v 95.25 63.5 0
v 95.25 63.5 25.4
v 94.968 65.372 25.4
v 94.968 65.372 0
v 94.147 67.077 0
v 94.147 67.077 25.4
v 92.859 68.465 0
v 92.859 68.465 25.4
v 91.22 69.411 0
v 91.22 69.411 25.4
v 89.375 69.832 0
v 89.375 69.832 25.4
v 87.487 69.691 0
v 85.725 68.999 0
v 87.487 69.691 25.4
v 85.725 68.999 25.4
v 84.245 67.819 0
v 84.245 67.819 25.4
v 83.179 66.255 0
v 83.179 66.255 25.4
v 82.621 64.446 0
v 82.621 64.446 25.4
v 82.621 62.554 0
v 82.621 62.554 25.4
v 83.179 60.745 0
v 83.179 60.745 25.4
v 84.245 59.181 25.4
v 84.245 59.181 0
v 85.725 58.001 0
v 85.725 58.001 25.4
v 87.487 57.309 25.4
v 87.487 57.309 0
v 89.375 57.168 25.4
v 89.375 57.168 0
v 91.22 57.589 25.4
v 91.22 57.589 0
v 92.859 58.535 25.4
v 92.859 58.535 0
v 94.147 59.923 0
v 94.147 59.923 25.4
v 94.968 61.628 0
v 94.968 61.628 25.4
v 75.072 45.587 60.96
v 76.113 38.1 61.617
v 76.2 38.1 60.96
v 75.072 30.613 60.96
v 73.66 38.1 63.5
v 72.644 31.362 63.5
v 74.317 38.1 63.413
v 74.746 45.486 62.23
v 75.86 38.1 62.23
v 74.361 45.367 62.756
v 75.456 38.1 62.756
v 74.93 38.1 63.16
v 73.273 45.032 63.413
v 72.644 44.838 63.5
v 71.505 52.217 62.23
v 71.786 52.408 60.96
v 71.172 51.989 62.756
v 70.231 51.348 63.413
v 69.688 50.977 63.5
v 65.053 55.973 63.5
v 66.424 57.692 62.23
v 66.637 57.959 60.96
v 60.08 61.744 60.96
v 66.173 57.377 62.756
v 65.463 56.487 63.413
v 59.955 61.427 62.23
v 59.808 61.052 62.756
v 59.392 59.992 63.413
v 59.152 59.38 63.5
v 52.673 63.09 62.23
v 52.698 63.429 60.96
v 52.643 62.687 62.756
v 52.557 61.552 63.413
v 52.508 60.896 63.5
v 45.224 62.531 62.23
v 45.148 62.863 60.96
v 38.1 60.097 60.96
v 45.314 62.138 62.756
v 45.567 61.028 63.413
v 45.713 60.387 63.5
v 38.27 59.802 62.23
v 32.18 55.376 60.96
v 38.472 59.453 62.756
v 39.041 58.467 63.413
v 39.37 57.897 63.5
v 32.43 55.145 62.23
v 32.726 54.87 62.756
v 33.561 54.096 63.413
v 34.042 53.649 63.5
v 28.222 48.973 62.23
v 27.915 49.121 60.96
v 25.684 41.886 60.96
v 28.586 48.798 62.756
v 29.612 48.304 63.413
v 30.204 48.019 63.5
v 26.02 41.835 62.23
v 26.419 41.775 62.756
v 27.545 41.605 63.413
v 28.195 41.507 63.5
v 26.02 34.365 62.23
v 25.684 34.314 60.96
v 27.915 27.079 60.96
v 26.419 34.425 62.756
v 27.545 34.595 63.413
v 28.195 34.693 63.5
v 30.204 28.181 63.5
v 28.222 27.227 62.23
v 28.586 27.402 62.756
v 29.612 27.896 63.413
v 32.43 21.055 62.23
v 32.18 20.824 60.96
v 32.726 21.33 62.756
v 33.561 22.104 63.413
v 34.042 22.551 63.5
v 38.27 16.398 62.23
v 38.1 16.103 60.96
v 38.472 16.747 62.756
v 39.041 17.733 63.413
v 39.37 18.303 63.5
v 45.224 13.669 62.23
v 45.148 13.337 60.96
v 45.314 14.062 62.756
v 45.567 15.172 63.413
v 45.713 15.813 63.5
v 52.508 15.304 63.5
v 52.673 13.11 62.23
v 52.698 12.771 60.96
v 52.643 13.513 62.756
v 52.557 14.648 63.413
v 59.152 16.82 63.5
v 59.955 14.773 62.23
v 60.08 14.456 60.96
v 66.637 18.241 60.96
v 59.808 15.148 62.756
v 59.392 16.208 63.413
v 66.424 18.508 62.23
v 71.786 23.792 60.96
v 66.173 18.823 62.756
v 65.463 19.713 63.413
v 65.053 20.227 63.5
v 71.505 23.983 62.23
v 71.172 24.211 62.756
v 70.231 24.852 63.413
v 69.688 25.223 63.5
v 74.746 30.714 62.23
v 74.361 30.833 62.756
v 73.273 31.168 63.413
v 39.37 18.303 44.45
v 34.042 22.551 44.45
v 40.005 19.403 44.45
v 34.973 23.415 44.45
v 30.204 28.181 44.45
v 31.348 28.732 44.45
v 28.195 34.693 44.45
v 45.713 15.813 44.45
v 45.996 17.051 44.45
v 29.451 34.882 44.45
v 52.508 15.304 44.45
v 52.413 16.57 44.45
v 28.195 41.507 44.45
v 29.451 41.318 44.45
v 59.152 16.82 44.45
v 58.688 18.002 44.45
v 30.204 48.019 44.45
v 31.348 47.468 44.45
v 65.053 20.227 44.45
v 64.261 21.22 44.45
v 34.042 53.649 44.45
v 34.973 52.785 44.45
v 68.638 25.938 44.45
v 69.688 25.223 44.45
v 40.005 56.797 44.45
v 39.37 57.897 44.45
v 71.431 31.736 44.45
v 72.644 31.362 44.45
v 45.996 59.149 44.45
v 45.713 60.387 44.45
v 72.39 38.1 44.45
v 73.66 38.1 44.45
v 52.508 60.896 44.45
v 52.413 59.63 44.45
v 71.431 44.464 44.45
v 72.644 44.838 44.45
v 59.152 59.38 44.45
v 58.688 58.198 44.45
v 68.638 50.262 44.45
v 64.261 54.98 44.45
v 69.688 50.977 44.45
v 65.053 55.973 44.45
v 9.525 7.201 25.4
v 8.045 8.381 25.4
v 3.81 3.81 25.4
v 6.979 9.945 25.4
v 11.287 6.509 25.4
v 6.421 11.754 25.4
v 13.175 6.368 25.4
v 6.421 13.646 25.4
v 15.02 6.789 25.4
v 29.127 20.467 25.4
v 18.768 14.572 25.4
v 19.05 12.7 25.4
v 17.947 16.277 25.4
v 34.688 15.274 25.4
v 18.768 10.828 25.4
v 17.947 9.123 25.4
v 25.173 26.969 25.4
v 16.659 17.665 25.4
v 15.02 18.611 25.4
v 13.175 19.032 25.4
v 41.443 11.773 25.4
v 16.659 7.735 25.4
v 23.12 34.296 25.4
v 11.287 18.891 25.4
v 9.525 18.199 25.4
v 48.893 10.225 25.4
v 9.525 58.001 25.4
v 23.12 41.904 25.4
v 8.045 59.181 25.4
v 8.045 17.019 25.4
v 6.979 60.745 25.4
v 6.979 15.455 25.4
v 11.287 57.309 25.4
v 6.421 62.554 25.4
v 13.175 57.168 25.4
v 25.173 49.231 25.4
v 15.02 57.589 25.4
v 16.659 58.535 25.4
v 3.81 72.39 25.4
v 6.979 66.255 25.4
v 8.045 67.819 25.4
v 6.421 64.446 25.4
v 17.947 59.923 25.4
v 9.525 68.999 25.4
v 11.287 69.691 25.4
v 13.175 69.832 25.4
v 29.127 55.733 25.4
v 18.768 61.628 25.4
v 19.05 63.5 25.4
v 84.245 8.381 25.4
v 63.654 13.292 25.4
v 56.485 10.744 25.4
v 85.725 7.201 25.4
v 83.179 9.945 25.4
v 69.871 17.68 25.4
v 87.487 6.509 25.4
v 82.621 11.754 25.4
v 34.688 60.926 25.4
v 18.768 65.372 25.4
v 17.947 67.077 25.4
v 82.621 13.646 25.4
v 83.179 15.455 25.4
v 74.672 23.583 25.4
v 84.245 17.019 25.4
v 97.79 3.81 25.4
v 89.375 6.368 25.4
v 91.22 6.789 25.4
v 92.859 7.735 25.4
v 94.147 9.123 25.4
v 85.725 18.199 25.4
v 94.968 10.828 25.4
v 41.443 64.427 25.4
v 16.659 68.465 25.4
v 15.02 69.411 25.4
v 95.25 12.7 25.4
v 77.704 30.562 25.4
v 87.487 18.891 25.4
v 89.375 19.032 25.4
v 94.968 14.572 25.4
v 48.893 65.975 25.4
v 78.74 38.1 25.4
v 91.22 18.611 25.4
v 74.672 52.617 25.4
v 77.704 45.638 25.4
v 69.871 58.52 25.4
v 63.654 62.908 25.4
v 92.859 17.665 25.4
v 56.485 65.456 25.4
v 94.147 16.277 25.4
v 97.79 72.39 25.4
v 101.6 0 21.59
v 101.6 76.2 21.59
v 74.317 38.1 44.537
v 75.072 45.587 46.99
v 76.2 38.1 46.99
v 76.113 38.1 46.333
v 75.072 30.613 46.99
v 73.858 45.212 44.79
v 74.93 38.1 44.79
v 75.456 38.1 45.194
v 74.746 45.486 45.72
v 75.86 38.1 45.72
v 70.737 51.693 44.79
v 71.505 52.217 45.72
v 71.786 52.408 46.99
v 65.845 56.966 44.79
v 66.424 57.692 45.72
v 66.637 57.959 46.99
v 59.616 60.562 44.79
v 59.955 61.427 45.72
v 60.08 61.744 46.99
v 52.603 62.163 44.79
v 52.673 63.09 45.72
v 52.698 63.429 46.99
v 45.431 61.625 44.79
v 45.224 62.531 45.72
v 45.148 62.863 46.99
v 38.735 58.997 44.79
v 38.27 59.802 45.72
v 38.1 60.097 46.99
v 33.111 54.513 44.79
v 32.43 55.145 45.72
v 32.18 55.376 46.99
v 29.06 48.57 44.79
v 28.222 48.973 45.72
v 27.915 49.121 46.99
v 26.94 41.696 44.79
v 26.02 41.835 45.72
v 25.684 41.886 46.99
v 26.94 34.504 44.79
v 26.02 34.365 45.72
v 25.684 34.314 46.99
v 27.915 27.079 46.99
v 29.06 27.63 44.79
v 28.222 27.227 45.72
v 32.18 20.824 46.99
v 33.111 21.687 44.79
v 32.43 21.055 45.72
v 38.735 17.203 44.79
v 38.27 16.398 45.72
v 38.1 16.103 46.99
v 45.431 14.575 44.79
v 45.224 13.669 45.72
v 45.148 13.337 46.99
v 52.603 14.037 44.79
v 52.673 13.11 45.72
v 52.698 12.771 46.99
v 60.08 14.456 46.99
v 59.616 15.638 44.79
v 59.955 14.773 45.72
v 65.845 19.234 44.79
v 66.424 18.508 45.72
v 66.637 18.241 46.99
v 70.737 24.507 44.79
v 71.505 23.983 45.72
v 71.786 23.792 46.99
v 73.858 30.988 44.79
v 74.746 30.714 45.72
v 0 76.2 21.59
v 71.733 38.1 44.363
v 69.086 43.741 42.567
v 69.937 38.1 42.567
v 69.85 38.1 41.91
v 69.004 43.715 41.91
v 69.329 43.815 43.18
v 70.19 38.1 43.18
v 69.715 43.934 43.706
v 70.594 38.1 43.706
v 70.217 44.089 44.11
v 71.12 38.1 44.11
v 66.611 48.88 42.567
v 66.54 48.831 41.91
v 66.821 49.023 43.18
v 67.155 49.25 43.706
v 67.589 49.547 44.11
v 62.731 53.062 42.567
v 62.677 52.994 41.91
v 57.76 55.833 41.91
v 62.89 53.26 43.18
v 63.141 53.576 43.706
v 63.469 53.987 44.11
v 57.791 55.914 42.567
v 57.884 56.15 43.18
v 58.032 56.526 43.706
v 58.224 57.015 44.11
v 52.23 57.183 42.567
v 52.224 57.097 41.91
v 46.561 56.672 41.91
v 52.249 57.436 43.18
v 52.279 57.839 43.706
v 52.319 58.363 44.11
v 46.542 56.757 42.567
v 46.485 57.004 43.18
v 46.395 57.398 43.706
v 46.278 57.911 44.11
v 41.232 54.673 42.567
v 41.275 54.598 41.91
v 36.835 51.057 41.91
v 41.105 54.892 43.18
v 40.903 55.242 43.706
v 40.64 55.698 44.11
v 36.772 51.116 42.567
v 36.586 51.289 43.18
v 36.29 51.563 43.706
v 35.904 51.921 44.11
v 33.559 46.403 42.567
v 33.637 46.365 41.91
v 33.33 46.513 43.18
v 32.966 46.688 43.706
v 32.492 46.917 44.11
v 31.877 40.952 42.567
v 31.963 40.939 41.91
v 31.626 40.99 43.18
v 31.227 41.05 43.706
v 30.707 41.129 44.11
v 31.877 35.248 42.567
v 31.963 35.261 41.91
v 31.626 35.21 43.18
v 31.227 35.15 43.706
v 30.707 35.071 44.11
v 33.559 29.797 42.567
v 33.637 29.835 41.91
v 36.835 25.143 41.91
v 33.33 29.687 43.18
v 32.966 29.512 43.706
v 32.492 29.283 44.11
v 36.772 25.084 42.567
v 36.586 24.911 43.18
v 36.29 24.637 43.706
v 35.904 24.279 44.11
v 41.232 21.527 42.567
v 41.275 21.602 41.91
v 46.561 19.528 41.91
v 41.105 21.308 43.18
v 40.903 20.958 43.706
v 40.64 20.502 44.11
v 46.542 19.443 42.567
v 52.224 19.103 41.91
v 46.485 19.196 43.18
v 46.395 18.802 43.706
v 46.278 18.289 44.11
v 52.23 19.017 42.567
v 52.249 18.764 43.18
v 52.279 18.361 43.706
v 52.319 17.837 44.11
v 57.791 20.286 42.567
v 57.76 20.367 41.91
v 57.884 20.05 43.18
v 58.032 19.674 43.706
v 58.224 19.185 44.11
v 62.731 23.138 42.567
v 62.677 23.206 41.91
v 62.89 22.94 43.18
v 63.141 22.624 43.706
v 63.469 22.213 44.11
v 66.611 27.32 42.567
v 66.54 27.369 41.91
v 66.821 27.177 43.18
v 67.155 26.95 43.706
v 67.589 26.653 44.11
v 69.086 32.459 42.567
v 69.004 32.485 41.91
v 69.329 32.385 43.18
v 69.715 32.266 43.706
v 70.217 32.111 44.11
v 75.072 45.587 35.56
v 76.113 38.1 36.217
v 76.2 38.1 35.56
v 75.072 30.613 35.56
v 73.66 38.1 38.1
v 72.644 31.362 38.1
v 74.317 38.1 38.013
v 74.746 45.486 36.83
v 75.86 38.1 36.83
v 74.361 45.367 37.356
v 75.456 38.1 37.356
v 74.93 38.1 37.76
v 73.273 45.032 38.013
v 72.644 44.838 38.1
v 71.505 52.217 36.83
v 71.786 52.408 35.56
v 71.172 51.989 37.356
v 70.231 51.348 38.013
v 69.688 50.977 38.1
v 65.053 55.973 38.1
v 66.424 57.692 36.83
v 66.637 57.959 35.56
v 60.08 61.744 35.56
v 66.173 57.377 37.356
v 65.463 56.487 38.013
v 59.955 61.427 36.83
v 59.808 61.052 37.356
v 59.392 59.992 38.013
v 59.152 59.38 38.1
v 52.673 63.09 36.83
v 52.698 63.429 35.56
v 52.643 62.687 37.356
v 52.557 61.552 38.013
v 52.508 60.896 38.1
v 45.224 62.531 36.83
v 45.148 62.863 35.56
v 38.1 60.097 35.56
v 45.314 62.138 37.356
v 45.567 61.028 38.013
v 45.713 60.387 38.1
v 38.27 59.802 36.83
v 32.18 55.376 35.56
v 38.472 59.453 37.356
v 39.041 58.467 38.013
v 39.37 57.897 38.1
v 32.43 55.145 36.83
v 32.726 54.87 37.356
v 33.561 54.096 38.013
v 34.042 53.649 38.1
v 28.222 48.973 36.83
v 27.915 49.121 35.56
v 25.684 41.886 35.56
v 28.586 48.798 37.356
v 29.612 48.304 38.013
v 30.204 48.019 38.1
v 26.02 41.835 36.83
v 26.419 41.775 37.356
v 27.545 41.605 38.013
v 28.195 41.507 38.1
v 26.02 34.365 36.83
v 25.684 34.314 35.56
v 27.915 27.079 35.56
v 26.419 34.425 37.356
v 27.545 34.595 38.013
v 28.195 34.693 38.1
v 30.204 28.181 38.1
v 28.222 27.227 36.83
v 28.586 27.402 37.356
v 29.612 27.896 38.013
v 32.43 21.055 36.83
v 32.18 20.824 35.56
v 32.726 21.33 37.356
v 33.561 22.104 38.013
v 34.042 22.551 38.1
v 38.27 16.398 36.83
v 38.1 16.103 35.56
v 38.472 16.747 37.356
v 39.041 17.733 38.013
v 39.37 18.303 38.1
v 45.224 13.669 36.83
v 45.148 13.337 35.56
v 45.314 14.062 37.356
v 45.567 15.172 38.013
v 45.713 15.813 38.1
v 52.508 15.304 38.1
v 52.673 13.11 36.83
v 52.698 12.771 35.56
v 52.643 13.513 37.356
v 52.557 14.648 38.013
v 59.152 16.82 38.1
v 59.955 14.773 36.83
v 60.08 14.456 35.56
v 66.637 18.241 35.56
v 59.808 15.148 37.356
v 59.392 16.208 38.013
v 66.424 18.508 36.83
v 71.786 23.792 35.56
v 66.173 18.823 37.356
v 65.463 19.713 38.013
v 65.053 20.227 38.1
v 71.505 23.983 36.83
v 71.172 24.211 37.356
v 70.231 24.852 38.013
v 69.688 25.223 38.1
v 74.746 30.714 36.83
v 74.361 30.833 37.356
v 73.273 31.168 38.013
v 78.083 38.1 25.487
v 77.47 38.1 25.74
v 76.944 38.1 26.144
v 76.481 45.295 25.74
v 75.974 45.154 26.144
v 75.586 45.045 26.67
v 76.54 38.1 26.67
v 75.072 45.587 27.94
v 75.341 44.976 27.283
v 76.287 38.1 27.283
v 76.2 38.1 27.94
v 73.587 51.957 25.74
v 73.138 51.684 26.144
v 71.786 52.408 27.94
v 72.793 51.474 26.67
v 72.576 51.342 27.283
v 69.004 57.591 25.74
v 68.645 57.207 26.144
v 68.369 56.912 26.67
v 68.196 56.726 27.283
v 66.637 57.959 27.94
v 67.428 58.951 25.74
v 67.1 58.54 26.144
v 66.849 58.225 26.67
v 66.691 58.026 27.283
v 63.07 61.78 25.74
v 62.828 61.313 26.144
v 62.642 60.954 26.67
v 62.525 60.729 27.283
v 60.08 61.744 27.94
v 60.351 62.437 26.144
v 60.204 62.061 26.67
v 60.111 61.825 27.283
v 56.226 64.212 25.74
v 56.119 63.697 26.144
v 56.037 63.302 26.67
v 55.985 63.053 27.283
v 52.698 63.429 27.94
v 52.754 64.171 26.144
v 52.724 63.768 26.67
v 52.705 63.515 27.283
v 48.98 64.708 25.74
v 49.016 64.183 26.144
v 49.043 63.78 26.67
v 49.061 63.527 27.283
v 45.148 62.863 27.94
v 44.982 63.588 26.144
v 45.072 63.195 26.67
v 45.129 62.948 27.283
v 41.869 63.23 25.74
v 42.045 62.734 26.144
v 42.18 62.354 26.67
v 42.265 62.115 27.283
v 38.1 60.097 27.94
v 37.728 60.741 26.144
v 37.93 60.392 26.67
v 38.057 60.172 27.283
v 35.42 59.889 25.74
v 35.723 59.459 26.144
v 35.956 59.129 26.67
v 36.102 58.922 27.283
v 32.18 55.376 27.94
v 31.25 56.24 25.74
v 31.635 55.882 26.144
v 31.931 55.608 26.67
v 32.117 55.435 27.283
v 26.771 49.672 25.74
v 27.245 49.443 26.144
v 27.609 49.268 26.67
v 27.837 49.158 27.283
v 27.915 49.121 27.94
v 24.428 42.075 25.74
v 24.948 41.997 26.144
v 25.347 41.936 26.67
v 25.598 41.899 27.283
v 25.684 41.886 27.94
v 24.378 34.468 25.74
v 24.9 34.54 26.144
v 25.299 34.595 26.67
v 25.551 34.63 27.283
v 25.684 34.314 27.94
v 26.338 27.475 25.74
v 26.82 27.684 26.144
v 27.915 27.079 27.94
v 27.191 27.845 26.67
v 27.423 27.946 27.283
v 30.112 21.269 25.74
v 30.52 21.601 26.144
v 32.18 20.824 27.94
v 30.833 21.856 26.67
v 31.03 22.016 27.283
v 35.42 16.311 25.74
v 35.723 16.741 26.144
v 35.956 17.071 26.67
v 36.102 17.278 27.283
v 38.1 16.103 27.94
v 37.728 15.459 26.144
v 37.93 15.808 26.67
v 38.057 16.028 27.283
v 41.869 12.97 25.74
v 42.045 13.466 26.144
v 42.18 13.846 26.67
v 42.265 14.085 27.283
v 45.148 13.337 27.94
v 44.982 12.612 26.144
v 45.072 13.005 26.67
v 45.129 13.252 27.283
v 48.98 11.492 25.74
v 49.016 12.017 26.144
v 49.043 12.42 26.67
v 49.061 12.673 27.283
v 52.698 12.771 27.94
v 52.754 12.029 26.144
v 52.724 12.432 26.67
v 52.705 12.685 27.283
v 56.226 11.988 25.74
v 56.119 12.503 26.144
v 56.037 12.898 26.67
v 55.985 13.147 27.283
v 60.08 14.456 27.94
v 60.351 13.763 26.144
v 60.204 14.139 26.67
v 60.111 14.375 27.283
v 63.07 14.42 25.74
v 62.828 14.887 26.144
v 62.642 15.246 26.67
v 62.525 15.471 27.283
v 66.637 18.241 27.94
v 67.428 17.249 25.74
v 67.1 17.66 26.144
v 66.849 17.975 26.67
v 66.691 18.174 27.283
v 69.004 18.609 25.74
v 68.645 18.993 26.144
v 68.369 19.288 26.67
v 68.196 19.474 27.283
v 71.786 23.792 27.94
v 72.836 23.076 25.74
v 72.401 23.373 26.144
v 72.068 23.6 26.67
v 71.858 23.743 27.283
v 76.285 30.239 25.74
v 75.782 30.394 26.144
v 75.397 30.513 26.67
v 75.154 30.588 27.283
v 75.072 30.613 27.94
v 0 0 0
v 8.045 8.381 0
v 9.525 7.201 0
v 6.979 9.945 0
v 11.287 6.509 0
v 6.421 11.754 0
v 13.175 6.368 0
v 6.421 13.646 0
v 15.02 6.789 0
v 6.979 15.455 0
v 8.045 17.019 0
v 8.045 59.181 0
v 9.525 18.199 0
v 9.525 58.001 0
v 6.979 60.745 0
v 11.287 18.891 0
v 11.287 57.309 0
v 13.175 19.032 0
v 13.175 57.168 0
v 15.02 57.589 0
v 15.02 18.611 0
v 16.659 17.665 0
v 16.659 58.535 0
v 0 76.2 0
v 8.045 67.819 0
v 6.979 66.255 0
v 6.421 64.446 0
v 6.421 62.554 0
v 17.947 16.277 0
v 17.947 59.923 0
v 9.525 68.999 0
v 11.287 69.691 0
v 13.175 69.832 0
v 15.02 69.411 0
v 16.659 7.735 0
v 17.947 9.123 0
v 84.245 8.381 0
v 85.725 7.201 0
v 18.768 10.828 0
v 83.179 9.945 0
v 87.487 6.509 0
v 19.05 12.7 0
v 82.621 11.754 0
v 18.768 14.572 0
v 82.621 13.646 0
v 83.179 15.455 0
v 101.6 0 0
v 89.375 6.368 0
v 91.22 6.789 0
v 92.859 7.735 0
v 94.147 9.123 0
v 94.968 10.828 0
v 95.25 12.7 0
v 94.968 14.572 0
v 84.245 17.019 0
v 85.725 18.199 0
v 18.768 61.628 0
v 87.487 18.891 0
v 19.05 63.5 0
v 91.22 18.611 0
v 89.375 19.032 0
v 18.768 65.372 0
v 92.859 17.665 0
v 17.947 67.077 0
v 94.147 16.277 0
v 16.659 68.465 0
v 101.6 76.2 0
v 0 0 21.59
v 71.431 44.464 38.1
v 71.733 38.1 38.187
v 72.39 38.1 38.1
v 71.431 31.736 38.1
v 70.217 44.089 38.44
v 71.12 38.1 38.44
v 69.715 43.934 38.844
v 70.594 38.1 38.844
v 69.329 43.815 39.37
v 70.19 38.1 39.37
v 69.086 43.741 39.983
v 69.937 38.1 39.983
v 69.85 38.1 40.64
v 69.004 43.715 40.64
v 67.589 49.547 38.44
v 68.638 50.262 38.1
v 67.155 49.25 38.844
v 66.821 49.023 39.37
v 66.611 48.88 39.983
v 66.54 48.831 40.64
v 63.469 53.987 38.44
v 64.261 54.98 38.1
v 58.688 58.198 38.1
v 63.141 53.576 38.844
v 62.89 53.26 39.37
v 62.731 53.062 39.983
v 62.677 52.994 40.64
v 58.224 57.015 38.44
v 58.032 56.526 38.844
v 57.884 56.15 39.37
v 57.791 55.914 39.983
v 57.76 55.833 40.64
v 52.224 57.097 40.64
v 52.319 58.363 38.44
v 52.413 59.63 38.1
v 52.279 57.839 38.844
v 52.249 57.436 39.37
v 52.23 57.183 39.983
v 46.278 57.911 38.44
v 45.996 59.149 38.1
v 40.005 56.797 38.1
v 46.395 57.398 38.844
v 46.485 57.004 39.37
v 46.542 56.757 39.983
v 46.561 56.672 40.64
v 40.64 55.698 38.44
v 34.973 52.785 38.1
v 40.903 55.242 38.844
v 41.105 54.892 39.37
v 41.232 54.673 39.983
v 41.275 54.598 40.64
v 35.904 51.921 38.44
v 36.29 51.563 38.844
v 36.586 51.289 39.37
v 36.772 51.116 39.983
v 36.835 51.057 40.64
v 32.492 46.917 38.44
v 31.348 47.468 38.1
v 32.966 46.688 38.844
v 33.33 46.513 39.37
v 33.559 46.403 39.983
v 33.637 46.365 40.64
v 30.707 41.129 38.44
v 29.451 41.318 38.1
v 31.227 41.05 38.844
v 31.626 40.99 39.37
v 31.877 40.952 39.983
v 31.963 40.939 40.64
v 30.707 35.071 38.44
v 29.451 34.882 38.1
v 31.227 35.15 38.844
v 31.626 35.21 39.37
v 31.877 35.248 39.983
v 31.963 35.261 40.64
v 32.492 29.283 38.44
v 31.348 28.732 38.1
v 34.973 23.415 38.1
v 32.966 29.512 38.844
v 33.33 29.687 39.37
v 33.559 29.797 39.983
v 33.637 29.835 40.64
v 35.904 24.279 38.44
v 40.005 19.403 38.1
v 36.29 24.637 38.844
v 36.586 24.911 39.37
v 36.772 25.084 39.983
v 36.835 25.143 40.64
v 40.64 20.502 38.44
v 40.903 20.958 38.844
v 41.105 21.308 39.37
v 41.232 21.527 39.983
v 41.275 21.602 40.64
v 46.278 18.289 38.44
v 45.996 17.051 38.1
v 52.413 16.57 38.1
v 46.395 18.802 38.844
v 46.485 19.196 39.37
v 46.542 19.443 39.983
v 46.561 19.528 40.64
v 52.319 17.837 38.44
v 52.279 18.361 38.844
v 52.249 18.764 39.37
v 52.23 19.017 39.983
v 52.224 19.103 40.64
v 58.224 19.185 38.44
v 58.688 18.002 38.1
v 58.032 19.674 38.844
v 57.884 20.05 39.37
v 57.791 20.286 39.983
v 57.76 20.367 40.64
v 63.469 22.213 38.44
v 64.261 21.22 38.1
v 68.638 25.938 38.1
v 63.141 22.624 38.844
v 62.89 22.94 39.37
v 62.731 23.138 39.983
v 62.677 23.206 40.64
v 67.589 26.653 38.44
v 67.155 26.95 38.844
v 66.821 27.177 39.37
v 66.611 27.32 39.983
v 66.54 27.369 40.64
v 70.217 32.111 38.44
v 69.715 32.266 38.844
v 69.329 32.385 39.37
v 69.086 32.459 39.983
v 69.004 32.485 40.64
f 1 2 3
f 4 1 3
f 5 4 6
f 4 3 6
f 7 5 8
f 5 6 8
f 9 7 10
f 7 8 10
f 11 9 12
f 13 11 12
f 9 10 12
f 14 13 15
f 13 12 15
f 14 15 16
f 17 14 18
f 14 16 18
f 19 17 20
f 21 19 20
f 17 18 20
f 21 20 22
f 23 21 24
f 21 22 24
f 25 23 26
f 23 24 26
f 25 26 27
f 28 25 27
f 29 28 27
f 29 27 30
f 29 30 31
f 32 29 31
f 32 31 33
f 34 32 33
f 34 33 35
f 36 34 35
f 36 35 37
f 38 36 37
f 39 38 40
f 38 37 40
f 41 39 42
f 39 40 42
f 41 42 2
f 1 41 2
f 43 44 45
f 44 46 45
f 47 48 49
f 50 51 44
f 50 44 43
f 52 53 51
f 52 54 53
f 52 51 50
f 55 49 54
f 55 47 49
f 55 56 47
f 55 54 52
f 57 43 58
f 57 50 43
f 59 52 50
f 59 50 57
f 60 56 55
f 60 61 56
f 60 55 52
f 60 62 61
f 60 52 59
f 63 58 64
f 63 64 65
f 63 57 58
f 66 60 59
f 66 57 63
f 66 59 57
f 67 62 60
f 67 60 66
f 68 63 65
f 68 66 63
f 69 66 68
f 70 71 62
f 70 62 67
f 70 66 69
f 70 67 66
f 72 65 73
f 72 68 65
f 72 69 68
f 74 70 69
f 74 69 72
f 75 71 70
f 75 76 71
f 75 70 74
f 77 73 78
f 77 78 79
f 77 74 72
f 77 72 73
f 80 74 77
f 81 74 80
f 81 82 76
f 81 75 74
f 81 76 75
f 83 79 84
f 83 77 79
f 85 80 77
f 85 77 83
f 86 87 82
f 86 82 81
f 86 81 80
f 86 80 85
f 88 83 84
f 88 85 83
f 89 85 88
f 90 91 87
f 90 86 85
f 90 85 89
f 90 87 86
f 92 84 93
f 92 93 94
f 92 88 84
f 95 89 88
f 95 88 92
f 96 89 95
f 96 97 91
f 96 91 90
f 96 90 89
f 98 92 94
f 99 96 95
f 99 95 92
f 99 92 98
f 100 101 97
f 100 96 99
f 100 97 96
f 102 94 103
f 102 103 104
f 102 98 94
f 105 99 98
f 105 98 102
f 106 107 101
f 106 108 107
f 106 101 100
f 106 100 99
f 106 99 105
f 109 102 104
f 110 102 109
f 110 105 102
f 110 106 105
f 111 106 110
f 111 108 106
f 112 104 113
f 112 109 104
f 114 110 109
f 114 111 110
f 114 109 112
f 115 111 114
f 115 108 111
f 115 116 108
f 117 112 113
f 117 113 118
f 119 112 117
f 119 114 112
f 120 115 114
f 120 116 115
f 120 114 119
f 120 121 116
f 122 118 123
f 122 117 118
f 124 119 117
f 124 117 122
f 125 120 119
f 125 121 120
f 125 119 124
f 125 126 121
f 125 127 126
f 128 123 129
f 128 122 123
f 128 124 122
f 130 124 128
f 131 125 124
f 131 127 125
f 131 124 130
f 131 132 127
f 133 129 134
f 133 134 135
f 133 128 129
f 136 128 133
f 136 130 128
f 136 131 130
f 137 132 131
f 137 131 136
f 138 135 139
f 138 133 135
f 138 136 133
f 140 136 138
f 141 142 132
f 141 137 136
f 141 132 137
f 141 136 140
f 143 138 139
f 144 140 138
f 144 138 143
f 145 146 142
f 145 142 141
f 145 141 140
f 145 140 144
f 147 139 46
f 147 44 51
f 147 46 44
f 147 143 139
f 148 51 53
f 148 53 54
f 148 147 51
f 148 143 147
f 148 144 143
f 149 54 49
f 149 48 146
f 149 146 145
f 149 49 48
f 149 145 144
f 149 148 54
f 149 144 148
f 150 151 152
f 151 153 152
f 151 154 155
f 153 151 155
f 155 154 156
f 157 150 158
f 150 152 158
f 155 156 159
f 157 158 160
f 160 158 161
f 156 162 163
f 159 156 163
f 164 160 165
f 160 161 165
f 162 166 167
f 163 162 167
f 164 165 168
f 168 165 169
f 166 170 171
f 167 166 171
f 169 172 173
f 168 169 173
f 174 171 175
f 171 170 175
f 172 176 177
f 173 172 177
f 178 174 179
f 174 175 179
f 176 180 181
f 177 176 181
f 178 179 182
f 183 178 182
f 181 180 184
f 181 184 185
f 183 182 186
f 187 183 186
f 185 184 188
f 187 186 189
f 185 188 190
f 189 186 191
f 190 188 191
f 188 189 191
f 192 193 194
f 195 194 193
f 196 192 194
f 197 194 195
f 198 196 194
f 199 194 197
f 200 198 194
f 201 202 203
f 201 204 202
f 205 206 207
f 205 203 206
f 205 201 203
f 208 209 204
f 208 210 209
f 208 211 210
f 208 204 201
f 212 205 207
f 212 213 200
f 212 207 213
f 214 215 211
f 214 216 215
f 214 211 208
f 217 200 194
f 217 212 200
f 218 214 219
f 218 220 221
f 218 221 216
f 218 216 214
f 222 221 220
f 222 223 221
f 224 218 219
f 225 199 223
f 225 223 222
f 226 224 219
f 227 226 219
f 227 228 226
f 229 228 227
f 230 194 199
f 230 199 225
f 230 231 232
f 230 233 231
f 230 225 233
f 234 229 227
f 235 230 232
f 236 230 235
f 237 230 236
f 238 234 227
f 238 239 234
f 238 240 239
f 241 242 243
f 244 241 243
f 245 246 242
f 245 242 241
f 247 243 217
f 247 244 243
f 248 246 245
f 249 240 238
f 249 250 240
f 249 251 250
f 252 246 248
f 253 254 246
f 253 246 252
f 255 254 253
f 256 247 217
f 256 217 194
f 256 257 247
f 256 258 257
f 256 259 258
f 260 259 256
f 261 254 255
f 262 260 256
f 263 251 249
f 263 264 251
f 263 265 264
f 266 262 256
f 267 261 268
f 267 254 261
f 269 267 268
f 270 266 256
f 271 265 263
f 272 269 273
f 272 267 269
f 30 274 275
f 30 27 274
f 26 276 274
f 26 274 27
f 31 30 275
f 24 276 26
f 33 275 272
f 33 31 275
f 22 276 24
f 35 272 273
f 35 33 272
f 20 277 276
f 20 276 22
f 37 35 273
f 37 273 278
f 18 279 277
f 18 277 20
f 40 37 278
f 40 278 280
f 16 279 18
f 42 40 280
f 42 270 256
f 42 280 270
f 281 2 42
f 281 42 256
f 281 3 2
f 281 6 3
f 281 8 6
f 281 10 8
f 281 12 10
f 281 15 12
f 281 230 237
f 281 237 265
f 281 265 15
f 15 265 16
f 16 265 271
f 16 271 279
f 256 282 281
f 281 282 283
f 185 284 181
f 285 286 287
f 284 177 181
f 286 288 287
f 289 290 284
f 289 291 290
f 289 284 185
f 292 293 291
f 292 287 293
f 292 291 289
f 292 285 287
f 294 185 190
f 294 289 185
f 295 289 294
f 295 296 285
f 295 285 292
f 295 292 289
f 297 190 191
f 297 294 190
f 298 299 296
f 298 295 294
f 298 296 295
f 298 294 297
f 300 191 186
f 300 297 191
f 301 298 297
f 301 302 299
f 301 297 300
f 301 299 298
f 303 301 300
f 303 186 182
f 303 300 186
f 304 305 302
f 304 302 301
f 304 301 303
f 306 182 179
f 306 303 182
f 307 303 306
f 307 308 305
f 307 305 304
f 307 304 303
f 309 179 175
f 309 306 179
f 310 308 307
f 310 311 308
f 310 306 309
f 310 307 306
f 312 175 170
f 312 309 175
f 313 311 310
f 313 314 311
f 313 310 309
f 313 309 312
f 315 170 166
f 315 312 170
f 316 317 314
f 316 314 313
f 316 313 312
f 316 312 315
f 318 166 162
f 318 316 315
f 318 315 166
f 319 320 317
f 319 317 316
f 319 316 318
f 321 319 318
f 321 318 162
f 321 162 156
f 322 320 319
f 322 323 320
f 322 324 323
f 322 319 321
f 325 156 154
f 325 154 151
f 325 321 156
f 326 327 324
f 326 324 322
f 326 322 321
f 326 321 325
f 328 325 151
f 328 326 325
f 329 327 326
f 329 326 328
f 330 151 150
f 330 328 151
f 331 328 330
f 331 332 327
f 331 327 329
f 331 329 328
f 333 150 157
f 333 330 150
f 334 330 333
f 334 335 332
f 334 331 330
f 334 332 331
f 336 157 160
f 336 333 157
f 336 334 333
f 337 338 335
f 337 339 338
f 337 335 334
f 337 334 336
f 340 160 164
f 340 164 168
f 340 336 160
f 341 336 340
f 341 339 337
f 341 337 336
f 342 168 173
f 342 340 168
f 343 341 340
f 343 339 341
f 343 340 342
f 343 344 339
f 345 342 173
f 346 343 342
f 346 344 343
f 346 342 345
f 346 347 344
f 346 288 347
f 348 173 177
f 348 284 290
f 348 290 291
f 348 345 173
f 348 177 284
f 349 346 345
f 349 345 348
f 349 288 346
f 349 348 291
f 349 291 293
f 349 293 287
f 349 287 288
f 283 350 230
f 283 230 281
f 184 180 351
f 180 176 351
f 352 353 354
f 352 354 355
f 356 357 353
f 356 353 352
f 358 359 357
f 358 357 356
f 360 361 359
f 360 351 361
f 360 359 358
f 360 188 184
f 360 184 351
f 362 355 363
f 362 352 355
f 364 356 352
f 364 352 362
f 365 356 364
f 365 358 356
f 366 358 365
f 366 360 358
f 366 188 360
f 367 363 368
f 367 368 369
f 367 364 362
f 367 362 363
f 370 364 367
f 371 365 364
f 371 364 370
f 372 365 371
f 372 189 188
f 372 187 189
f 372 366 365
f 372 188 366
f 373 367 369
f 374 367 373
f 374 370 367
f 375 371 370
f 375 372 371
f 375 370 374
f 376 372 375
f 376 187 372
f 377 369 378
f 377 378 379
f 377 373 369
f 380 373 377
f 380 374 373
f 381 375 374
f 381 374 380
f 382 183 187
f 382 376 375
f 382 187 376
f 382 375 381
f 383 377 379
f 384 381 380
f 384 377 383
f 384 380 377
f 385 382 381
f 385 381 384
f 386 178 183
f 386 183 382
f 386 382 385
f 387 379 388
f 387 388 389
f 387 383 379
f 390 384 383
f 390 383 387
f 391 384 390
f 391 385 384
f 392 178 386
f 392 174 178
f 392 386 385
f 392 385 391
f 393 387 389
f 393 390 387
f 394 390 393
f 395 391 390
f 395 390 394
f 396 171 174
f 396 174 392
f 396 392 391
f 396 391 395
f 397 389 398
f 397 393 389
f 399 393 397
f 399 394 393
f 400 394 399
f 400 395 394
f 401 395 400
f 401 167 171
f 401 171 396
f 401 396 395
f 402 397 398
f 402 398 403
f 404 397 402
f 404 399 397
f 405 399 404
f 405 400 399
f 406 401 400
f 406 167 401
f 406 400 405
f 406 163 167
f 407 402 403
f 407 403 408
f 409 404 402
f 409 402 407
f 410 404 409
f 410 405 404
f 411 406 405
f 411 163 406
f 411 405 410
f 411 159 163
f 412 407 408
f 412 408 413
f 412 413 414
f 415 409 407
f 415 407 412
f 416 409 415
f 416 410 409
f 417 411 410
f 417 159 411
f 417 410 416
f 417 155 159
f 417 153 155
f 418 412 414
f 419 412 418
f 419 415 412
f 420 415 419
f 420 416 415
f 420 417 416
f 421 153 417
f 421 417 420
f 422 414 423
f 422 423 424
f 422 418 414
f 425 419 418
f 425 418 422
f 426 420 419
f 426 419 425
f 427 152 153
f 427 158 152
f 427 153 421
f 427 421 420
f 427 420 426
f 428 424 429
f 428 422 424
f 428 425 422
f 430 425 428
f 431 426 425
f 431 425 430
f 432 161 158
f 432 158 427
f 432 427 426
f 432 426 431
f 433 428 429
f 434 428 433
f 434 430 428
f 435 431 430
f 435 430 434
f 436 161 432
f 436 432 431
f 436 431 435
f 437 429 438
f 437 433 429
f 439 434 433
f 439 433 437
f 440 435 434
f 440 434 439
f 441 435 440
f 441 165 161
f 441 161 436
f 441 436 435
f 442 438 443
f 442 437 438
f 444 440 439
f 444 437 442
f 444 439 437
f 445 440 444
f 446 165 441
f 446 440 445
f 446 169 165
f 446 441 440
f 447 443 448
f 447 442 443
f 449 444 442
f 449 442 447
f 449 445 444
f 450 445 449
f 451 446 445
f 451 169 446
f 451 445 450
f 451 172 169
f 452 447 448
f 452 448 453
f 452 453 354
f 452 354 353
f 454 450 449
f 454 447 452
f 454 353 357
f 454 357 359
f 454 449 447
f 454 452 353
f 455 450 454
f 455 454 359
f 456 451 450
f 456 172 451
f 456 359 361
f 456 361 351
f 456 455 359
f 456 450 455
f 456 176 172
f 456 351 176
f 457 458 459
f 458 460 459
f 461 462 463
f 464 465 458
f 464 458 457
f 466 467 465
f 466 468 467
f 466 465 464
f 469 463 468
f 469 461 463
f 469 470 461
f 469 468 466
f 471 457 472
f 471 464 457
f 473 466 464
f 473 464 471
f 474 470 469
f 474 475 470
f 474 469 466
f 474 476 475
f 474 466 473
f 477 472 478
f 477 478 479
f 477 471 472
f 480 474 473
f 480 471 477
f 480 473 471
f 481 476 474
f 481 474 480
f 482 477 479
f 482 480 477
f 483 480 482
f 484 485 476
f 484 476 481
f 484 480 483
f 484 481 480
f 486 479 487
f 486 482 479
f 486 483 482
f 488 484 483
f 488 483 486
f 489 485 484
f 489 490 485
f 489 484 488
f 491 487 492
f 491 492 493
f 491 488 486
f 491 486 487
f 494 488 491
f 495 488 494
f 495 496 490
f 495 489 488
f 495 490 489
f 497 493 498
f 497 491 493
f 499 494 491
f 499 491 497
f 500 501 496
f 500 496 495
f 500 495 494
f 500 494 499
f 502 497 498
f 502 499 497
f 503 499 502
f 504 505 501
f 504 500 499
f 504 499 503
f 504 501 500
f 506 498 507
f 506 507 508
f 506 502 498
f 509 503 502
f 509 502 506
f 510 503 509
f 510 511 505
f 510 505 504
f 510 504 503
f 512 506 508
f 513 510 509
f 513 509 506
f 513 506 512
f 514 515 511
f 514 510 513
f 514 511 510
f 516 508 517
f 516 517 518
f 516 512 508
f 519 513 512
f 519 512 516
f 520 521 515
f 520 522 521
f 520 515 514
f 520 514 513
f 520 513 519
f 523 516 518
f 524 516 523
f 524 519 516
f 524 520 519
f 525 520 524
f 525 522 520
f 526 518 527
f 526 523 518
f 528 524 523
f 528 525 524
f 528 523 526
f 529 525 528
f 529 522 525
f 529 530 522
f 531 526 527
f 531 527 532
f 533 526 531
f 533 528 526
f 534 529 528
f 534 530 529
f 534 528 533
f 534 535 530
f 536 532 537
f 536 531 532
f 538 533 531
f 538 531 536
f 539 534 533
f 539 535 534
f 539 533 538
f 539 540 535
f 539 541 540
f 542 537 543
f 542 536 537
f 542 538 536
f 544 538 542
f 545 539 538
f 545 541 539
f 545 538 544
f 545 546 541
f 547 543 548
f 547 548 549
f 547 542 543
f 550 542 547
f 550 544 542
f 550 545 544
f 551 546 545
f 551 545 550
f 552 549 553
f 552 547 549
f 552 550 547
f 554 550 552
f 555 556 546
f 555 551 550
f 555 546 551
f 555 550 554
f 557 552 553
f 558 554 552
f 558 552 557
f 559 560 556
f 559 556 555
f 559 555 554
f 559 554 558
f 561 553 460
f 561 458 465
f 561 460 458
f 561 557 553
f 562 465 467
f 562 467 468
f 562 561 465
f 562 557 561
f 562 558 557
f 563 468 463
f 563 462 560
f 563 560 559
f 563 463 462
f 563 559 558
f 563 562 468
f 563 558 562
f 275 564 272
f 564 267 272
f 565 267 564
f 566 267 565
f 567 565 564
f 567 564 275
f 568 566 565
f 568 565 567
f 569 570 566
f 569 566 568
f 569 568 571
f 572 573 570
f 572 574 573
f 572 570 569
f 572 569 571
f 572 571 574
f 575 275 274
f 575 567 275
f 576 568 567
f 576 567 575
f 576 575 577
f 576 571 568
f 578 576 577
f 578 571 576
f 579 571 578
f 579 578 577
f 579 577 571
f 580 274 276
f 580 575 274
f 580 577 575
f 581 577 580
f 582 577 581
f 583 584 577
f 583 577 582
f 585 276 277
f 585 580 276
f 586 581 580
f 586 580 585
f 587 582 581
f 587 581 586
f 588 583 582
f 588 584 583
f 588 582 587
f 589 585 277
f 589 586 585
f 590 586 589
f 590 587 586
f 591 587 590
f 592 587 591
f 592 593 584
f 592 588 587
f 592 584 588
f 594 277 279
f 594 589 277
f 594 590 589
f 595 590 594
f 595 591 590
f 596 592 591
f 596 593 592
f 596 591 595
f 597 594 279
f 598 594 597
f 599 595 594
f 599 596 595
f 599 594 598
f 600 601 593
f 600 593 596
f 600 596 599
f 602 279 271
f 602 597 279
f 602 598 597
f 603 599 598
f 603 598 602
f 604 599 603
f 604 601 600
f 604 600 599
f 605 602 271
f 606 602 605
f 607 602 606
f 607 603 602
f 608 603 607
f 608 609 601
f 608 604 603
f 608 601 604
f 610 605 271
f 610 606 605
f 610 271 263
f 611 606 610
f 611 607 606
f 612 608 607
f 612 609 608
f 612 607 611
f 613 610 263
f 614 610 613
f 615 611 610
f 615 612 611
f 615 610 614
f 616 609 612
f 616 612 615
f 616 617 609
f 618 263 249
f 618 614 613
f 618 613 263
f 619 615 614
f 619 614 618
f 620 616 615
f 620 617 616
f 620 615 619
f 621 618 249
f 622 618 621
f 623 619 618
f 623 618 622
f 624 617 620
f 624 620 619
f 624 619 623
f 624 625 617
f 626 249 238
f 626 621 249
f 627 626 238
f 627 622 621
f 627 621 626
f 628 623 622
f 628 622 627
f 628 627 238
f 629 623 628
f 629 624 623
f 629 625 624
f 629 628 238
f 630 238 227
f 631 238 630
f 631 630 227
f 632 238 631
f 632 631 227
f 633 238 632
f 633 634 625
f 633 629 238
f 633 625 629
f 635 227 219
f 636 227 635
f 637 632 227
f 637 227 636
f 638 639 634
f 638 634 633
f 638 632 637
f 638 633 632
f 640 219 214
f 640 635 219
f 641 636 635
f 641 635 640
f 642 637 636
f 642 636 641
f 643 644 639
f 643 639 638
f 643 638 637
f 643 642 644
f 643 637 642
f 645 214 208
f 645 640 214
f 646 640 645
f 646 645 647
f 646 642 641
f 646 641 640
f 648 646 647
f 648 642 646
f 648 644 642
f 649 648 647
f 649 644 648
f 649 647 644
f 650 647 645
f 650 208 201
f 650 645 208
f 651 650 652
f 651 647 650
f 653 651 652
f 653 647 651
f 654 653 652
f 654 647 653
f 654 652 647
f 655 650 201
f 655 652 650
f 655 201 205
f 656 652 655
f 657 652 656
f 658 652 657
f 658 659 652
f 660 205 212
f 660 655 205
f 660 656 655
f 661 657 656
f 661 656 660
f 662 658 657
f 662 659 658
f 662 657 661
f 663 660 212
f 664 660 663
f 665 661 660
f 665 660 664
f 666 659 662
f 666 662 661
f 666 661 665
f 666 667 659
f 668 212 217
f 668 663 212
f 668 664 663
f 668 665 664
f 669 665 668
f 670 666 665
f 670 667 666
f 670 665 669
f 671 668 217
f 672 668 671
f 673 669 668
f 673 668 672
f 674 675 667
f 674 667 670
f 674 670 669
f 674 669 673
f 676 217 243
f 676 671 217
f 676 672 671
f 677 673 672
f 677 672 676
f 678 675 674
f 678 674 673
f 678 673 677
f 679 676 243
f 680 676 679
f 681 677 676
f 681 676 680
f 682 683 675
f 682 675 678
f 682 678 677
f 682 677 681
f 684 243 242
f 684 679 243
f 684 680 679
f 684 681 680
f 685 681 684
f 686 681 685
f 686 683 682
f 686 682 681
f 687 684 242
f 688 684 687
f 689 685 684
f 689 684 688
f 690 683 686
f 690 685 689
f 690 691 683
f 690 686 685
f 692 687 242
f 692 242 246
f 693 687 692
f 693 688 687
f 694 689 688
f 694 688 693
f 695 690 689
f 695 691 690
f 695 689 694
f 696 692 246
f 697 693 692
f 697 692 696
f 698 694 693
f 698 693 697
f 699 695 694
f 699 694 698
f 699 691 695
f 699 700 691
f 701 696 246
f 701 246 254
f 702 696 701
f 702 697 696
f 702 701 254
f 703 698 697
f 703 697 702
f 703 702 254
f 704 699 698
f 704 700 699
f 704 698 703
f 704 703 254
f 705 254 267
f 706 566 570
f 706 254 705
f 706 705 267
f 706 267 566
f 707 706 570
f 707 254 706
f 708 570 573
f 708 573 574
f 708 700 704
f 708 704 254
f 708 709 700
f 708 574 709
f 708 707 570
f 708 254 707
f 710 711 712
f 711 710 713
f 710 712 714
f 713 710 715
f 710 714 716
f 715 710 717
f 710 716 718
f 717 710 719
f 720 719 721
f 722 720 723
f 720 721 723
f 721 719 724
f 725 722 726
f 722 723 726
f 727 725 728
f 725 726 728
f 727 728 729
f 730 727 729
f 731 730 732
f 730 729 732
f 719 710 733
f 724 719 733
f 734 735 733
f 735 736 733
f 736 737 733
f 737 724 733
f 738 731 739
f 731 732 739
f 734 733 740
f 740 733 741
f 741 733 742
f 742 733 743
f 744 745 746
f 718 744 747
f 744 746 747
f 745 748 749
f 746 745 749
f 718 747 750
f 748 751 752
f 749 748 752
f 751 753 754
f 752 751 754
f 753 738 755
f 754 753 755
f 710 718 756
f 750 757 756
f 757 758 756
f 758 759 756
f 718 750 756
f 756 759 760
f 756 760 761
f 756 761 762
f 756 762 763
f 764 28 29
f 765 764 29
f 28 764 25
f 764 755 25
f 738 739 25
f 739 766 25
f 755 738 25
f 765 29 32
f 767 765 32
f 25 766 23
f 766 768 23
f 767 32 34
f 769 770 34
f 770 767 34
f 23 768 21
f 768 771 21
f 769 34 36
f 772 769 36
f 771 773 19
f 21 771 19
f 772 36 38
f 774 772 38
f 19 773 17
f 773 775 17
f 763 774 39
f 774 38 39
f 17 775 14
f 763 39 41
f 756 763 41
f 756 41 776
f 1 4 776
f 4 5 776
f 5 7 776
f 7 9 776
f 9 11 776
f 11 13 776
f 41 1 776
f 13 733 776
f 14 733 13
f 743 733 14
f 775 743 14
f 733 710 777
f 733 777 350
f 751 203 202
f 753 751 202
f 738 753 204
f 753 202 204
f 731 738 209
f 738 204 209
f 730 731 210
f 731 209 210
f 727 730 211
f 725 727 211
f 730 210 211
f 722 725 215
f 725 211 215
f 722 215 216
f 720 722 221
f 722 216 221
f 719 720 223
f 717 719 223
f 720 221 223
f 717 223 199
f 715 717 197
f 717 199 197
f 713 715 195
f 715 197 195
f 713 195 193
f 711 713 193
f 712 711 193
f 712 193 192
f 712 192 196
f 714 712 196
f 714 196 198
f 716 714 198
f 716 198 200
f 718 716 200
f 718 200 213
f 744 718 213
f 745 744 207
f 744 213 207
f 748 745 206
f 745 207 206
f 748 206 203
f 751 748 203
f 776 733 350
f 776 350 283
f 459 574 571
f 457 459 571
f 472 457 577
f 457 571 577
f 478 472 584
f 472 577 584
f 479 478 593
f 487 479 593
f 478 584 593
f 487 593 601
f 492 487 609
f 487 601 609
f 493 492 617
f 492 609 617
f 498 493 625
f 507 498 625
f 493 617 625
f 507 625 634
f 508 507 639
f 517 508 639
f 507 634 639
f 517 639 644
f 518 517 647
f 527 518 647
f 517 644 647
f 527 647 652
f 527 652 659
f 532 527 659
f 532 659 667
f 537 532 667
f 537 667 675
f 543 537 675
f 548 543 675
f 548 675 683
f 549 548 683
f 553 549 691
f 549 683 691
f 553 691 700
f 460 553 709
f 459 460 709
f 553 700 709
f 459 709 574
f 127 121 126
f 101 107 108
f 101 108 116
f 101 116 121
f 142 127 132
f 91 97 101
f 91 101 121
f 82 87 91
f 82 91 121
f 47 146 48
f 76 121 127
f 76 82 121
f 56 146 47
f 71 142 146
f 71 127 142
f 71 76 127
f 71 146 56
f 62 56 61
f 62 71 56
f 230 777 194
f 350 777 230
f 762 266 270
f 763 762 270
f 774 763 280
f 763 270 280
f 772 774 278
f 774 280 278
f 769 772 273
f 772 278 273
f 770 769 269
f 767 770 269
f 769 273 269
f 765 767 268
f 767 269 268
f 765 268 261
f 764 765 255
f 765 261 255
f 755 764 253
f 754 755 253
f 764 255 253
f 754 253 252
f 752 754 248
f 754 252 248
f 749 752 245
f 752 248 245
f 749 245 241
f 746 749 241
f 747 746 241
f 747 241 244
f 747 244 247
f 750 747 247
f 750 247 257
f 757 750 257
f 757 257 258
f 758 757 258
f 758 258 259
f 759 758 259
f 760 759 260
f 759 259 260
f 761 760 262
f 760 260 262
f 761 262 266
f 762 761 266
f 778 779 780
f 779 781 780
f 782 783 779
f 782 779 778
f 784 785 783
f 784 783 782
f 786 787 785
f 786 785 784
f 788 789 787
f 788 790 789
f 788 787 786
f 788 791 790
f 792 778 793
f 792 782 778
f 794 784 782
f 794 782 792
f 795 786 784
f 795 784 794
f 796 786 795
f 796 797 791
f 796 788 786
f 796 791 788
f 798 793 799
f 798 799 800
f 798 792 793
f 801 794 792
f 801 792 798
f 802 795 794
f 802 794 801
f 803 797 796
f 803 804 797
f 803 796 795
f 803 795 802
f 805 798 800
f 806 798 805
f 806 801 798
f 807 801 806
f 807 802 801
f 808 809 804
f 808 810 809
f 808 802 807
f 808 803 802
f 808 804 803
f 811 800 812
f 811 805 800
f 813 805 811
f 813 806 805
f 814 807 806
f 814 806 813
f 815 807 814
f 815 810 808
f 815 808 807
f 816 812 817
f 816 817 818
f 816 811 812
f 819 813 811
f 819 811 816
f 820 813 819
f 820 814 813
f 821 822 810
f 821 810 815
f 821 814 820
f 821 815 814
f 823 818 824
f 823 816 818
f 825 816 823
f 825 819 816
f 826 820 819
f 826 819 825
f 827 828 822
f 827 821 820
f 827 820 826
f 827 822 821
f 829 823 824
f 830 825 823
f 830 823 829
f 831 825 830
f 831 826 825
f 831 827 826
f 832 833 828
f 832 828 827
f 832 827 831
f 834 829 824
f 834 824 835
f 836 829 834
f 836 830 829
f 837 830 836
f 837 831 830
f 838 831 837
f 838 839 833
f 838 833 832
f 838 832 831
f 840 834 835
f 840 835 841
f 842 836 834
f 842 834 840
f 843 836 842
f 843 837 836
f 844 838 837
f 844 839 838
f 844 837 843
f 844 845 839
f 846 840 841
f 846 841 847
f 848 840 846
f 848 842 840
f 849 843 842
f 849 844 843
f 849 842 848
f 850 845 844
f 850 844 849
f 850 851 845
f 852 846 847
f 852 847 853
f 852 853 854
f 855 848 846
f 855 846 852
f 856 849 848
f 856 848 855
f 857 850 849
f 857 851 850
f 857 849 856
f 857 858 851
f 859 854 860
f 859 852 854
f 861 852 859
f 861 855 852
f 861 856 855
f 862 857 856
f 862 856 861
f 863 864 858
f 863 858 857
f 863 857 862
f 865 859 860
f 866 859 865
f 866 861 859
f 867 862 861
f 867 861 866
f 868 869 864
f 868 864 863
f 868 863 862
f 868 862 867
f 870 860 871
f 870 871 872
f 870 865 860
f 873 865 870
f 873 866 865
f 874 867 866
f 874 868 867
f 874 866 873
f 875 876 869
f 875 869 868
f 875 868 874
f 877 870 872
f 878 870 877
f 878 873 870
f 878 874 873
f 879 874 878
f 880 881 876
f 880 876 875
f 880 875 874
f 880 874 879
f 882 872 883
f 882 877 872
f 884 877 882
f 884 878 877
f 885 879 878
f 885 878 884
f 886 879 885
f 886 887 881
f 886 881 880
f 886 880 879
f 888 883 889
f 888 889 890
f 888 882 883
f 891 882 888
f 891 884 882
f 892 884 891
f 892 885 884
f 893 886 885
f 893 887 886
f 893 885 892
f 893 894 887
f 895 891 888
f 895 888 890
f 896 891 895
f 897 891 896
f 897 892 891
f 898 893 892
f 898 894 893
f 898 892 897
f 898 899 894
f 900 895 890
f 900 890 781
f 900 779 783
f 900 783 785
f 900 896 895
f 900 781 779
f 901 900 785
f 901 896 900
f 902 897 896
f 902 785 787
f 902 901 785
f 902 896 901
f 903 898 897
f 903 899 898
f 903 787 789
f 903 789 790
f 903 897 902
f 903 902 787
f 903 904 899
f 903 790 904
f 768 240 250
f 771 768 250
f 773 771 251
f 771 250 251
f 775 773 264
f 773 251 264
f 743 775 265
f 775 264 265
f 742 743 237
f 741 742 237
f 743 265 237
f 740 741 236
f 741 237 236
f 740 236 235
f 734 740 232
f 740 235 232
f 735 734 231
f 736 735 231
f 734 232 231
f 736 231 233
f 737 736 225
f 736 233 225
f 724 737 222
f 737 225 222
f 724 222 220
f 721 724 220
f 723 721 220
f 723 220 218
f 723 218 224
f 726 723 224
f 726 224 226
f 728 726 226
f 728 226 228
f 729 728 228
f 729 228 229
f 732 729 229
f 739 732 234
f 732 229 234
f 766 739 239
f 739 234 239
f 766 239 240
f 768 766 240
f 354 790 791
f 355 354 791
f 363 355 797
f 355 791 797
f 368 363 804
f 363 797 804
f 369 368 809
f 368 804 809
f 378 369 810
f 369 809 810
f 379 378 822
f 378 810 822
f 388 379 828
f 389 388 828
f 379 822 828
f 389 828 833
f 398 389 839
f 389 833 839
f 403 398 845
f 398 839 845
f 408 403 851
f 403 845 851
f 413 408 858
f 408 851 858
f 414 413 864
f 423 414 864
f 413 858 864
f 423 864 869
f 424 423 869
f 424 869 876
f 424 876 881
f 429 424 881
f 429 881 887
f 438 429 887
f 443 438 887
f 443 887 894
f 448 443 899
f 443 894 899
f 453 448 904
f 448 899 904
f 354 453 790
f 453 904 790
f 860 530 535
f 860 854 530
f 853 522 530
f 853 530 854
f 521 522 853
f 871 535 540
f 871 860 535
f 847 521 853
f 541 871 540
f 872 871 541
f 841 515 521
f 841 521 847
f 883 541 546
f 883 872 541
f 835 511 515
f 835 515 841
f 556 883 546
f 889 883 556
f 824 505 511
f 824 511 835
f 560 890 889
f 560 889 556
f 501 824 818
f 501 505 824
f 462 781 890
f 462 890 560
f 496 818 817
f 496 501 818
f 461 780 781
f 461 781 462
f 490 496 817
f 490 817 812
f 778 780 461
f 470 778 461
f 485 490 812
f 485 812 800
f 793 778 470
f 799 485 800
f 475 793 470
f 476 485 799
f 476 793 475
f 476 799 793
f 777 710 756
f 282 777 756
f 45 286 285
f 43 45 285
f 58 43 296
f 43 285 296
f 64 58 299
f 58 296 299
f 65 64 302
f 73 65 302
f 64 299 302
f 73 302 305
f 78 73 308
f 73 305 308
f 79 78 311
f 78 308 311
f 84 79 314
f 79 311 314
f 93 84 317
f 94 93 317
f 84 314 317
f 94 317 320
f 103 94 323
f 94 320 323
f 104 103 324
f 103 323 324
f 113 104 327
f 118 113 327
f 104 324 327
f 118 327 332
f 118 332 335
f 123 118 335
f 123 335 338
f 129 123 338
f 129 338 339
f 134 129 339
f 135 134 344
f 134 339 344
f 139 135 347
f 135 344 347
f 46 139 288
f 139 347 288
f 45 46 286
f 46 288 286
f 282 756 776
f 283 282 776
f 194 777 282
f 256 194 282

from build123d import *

# Parameters (mm, degrees)
F0_W     = 101.6
F0_H     = 76.2
F1_DEPTH = 25.4
F2_R     = 6.35
F3_DEPTH = 25.4
F4_R     = 25.4
F5_DEPTH = 12.7
F6_R     = 19.05
F7_DEPTH = 6.35
F8_R     = 25.4
F9_DEPTH = 19.05
F10_SIZE = 3.81
F11_R    = 2.54


with BuildPart() as f1:
    # F0 (on Top) → F1 (new body)
    with BuildSketch(Plane.XY):
        with Locations((50.8, 38.1)):
            Rectangle(F0_W, F0_H)
    extrude(amount=F1_DEPTH)

    # F2 (on face) → F3 (cut)
    with BuildSketch(Plane.XY.offset(25.4)):
        with Locations((12.7, 63.5)):
            Circle(F2_R)
        with Locations((88.9, 12.7)):
            Circle(F2_R)
        with Locations((88.9, 63.5)):
            Circle(F2_R)
        with Locations((12.7, 12.7)):
            Circle(F2_R)
    extrude(amount=-F3_DEPTH, mode=Mode.SUBTRACT)

    # F4 (on face) → F5 (join)
    with BuildSketch(Plane.XY.offset(25.4)):
        with Locations((50.8, 38.1)):
            Circle(F4_R)
    extrude(amount=F5_DEPTH)

    # F6 (on face) → F7 (join)
    with BuildSketch(Plane.XY.offset(38.1)):
        with Locations((50.8, 38.1)):
            Circle(F6_R)
    extrude(amount=F7_DEPTH)

    # F8 (on face) → F9 (join)
    with BuildSketch(Plane.XY.offset(44.45)):
        with Locations((50.8, 38.1)):
            Circle(F8_R)
    extrude(amount=F9_DEPTH)

    # F10
    f10_edges = [f1.edges().sort_by_distance(p)[0] for p in [
        (101.6, 38.1, 25.4),
        (50.8, 0, 25.4),
        (50.8, 76.2, 25.4),
        (0, 38.1, 25.4),
    ]]
    chamfer(f10_edges, length=F10_SIZE)

    # F11
    f11_edges = [f1.edges().sort_by_distance(p)[0] for p in [
        (25.4, 38.1, 25.4),
        (25.4, 38.1, 38.1),
        (31.75, 38.1, 38.1),
        (25.4, 38.1, 44.45),
        (31.75, 38.1, 44.45),
        (25.4, 38.1, 63.5),
    ]]
    fillet(f11_edges, radius=F11_R)


solid = f1.part
